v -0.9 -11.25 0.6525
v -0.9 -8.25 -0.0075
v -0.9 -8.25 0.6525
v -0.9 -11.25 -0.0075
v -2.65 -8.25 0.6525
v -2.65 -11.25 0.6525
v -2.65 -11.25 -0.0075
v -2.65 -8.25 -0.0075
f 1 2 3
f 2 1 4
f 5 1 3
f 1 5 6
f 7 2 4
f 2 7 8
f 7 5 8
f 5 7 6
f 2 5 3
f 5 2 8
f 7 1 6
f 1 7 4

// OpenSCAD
module channel1(){
    rotate ([0,0,270])
        rotate_extrude(angle=90, $fn = 300)
            translate([.5, 0]) square([.6,.325],true);
    
    translate([0,1.11,-.001])
        rotate_extrude(angle=45, $fn = 300)
            translate([.5, 0]) square([.6,.325],true);
    
    translate([.2,0,-.064])
        cube([.6, 1.25,.225],false);
    
    translate([0,1.11,-.001])
        rotate_extrude(angle=45, $fn = 300)
            translate([.5, 0]) square([.6,.325],true);
    
      translate([.14, 1.25,-.064])
      rotate ([0,0,45])
        cube([.6, 1.4,.225],false); 
}

module channel2(){  
    translate([-1.864, -8.75,-.064])
        cube([.6, 1.25,.225],false);
   
    translate([-1.0625, -7.5,-.001])
    rotate ([180,0,180])
        rotate_extrude(angle=45, $fn = 300)
            translate([.5, 0]) square([.6,.325],true);
    
      translate([-.25, -6.4,-.064])
      rotate ([0,0,135])
        cube([.6, 1.4,.225],false); 
}

module channel3(){

    translate([-.875, 4,-.001])
        rotate_extrude(angle=45, $fn = 300)
            translate([.5, 0]) square([.6,.325],true);
    
    translate([-.675, -3.975,-.064])
        cube([.6, 8,.225],false);
    
    translate([4.75, -2.04,-.064])
    rotate([0,0,90])
        cube([.6, 5,.225],false);
    
    translate([-.175, -3.975,-.064])
        cube([.6, 2.5,.225],false);
    
    translate([-3, -2.75,-.001])
    rotate([0,0,90])
        rotate_extrude(angle=90, $fn = 300)
            translate([.5, 0]) square([.6,.525],true);
    
    translate([-.875, -2.75,-.001])
        rotate_extrude(angle=90, $fn = 300)
            translate([.5, 0]) square([.6,.325],true);
            
    translate([-.8, -2.55,-.064])
    rotate([0,0,90])
        cube([.6, 2.25,.325],false);   
}

module riser2_cutout(){ // riser for kettle
    union(){
        translate([-.625, 0, .375])
        cylinder(1, r=.25, center = true, $fn=30);
        translate([.625, 0, .375])
        cylinder(1, r=.25, center = true, $fn=30);
    }
}

module button_cutout(){ // push botton cutout
  
    translate([.25, -.5, -.07]) 
       cube([1.75, 3, .66], center = false);

 /*     
    translate([.5, 1.75, .5125]) //control button
        button();
  
    translate([.5, 0, .5125])  // north button
        button();
    
    translate([.875, .5, .5125]) // west button
        button();
    
    translate([.125, .5, .5125]) // east button
        button();
    
    translate([.5, 1, .5125])
        button();          // south button    
    */
}
    
module button(){ // push botton 

        translate([.625, 0, .166])
        color( "black", 1.0 )
            cylinder(.1875, r=.0625, center = true, $fn=30);
    
        translate([.625, 0, 0])
             cube([.25, .4375, .156], center = true);  
}

module StepMotor28BYJ_Cutout(){
    union(){
        translate  ([-.315,0, 0])
            cylinder(h = 1, r = .55, center = true, $fn = 32);
        translate([-.815, 0, 0])
            cube([.5, .75, 1], center = true);
        }       
}

module motor_bases() {
    
difference (){
union(){
    translate([0, 2.89, .375])
        cylinder(.75, r=3.5, $fn=300, center=true); // cup platform
        
    translate([0, -2, .375])
        cube([2.9375, 4, .75], center = true); // center arm
    
    translate([-1.965, .2025, .375])
    rotate([0, 0, 100])
        cube([.5, 1, .75], center = true); // west arm filler
   
    translate([-3.5, 2.37, .375])
    rotate([0, 0, 317])
        cube([.5, 1, .75], center = true); // west arm filler 
   
    translate([1.362, 5.9, .375])
    rotate([0, 0, 19])
        cube([.5, 1, .75], center = true); // center/ north arm filler
        
    translate([-1.362, 5.9, .375])
    rotate([0, 0, 341])
        cube([.5, 1, .75], center = true); // center/ north arm filler 
    
    translate([1.965, .2025, .375])
    rotate([0, 0, 80])
        cube([.5, 1, .75], center = true); // east arm filler 
    
    translate([3.5, 2.37, .375])
    rotate([0, 0, 43])
        cube([.5, .5, .75], center = true); // east arm filler 
           
    translate([-1.27, -.2, .375])
    rotate([0, 0, 33])
        cube([.5, .5, .75], center = true); // center arm filler north west
    
    translate([1.27, -.2, .375])
    rotate([0, 0, -30])
        cube([.5, .5, .75], center = true); // center arm filler north east
       
    translate([-1.27, -3.72, .375])
    rotate([0, 0, 332])
        cube([.5, .5, .75], center = true); // center arm filler south west 
    
    translate([1.27, -3.72, .375])
    rotate([0, 0, 28])
        cube([.5, .5, .75], center = true); // center arm filler south east 
    
    translate([0, 5.774, .375])
    rotate([0, 0, 0])
        cube([2.0625, 5.774, .75], center=true); // north arm
        
    translate([2.5, 1.45, .375])
    rotate([0, 0, 60])
        cube([2.0625, 5.774, .75], center=true); // east arm  
      
    translate([-2.5, 1.45, .375])
    rotate([0, 0, 120])
        cube([2.0625, 5.774, .75], center=true); // west arm
    
    translate([0, 7.245, 0])
        cylinder(.75, r=1.875, $fn=300, center=false); // north outcrop
    
    translate([-3.75, .75, 0])
        cylinder(.75, r=1.875, $fn=300, center=false); // west outcrop
    
    translate([3.75, .75, 0])
        cylinder(.75, r=1.875, $fn=300, center=false); // east outcrop

    translate([0, -8.5, 0]) // base for kettle
        hull(){                   
            translate([0, 1, .375])
            cylinder(.75, r=3, $fn=300, center=true); 
            translate([0, 2.25, .375])
            cylinder(.75, r=3, $fn=300, center=true); 
    }
}

    translate([-1.593, -.347, .375])
        cylinder(.875, r=.125, $fn=30, center=true); // Round corner cent. platform north west

    translate([1.593, -.347, .375])
        cylinder(.875, r=.125, $fn=30, center=true); // Round corner cent. platform north east

    translate([-1.593, -3.567, .375])
        cylinder(.875, r=.125, $fn=30, center=true); // Round corner cent. platform south west

    translate([1.593, -3.567, .375])
        cylinder(.875, r=.125, $fn=30, center=true); // Round corner cent. platform south east

    translate([-1.965, -.14, .375])
        cylinder(.875, r=.125, $fn=30, center=true); // Round corner west outcrop

    translate([-3.609, 2.739, .375])
        cylinder(.875, r=.125, $fn=30, center=true); // Round corner west outcrop

    translate([1.966, -.1375, .375])
        cylinder(.875, r=.125, $fn=30, center=true); // Round corner east outcrop

    translate([3.609, 2.739, .375])
        cylinder(.875, r=.125, $fn=30, center=true); // Round corner east outcrop

    translate([1.639, 6.106, .375])
        cylinder(.875, r=.125, $fn=30, center=true); // Round corner north outcrop
        
    translate([-1.639, 6.106, .375])
        cylinder(.875, r=.125, $fn=30, center=true); // Round corner north outcrop     
}
}

///////////////// CODE BEGINS//////////////////

difference() {
 //   translate([0,-2.89,0])
 //      motor_bases();
 /*  
    translate([1.5,-9, -.01])
        channel1(); 
   
    translate([0, 0, 0])
        channel2(); 
    
    translate([0, 0, 0])
        channel3();
*/
    translate([-2.9, -10.75, .0625])
        button_cutout();
/*   
    translate([-1.5, -5, .145]) 
        cube([ .75, 2.5, .3], center=true); // outlet cutout
    
    translate([0, -5.3, .24]) 
        cube([ 2.4375, 3.126, .5], center=true); // board cutout

    translate([0, 0, .501])
        cylinder(.25, r=3.625, $fn=30); //removes material from platform for effector
        */
    
////Through Holes//////
   
    translate([-1, 5.193, .375]) //north stepper cutout
    rotate ([0, 180, 300])    
        StepMotor28BYJ_Cutout();

    translate ([-4.0003, -3.4675, .375]) //west stepper cutout
    rotate ([0, 180, 60])
        StepMotor28BYJ_Cutout();

    translate ([5.0003, -1.7355, .375]) //east stepper cutout    
        rotate ([0, 180, 180])
        StepMotor28BYJ_Cutout();
         
    translate([.46, -9.5, .375]) //kettle stepper cutout
        rotate ([0, 0, 180])
        StepMotor28BYJ_Cutout();
        
    translate([-0, -7.45, 0])  
        riser2_cutout();
   
///// Marking of eyelet locations -- tool change small bit 
      
    //translate([0, 5.77, .5])
        //%cylinder(1.55, r=.015, $fn=30, center=false); // cable pivot point north
    
    //translate([-5, -2.89, .5])
        //%cylinder(.55, r=0.015, $fn=30, center=false); // west outcrop
     
    //translate([5, -2.89, .50])
        //%cylinder(.55, r=.015, $fn=30, center=false); // east outcrop
  
    //translate([0, 0, .25])
        //%cylinder(.55, r=.015, $fn=30, center=false); // center (coordinate 0,0)
        
    translate([0, 5.895, .5625])
        cylinder(.55, r=.015, $fn=30, center=false); // cable pivot point north w/offset
            
    translate([-5.108, -2.9525, .5])
        cylinder(.55, r=0.015, $fn=30, center=false); // west outcrop w/offset
        
    translate([5.108, -2.9525, .5])
        cylinder(.55, r=.015, $fn=30, center=false); // east outcrop w/offset
        
    translate([0, -11.45, .5])
        cylinder(.55, r=.015, $fn=30, center=false); // kettle rear eyelette
        
    translate([0, -5.1375, .5])
        cylinder(.55, r=.015, $fn=30, center=false); // kettle front eyelette
}
